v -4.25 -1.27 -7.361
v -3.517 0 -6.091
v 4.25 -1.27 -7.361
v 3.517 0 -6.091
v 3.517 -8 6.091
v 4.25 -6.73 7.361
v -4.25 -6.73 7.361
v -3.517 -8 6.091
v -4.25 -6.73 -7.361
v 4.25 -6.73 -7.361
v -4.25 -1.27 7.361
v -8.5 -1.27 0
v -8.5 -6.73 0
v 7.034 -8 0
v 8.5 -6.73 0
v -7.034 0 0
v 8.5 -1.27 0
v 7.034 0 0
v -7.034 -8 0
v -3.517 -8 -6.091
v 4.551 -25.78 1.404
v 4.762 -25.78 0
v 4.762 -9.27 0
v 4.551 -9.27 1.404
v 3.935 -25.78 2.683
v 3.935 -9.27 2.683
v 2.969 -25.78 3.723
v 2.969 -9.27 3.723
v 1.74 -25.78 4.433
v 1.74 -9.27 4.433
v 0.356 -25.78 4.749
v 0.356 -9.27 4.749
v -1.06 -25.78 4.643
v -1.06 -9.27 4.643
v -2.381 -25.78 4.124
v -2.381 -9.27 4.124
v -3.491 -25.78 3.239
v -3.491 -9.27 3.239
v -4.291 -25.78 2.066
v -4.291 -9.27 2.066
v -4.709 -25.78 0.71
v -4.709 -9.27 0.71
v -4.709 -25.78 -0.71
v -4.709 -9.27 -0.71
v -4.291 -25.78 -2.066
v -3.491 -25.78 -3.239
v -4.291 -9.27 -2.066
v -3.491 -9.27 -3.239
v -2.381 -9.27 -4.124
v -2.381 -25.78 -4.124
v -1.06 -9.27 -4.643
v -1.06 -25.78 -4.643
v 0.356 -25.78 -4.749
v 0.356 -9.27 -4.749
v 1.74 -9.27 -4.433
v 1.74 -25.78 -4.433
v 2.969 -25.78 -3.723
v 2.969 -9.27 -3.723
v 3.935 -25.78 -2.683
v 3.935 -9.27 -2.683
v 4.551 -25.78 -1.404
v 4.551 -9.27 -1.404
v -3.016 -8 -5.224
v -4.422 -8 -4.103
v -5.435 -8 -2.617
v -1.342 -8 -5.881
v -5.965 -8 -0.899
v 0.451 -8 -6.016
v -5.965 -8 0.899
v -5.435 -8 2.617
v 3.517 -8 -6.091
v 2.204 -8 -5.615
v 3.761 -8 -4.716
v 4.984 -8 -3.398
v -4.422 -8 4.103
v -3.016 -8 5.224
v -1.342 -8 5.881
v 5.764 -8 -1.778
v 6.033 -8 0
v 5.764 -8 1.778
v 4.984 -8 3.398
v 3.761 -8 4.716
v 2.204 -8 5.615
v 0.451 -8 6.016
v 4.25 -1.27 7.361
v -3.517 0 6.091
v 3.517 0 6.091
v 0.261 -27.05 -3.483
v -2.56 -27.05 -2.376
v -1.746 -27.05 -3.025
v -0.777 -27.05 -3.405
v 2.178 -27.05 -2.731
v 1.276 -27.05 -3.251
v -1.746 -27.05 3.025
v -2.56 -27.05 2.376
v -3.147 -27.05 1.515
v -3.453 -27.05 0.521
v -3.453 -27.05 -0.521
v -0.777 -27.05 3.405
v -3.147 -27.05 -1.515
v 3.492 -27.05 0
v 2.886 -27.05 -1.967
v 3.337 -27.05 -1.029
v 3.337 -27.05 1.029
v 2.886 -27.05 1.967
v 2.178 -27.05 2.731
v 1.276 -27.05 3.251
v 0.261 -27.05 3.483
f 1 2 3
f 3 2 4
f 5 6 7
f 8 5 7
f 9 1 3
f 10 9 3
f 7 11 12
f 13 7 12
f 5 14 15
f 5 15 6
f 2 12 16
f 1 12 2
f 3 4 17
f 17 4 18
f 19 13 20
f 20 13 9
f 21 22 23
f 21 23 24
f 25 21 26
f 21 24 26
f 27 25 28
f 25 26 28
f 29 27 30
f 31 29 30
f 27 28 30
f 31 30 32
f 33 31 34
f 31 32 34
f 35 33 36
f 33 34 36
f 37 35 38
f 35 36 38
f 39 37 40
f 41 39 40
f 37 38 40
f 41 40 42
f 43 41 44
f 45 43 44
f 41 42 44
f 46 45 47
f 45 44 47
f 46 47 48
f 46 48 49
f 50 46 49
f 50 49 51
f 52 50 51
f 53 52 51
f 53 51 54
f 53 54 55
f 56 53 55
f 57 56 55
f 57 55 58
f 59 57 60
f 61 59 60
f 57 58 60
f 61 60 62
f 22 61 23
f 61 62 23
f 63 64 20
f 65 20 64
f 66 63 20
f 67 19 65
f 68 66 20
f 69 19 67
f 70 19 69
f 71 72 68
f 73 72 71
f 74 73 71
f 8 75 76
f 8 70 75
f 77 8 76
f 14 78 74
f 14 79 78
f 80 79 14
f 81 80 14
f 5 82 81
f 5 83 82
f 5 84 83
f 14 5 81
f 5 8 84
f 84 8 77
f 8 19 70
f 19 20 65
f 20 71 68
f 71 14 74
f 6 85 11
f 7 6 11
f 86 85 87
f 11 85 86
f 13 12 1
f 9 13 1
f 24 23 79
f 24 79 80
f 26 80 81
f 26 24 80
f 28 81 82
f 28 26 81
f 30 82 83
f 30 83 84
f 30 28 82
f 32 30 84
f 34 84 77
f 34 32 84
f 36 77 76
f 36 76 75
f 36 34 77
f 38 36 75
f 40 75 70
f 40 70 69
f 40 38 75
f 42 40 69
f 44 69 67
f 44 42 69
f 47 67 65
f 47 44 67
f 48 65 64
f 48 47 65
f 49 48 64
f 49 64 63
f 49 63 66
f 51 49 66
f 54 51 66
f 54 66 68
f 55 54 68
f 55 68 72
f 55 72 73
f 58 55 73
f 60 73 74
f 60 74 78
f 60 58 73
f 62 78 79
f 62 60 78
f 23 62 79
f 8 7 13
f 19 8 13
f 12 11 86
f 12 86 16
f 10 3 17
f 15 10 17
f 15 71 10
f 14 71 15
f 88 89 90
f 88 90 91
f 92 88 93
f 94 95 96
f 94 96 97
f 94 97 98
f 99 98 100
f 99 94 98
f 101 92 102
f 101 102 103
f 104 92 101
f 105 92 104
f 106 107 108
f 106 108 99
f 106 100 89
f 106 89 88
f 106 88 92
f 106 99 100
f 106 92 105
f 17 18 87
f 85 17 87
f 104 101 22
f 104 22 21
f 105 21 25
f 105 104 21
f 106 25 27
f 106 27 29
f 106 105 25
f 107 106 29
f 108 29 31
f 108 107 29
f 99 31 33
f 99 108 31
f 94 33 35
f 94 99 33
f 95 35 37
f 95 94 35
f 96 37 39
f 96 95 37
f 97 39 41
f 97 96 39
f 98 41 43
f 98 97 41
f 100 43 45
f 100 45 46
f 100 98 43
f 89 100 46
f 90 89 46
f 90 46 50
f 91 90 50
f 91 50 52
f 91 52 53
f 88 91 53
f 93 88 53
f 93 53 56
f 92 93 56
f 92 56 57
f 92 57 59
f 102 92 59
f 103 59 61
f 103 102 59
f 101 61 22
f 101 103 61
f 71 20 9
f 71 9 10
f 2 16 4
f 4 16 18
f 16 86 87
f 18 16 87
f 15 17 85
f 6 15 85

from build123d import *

# Parameters (mm, degrees)
F1_DEPTH = 8
F2_R     = 4.7625
F3_DEPTH = 19.05
F4_SIZE  = 1.27


with BuildPart() as f1:
    # F0 (on Front) → F1 (new body)
    with BuildSketch(Plane.XZ):
        Polygon((4.25, -7.361216), (8.5, 0), (4.25, 7.361216), (-4.25, 7.361216), (-8.5, 0), (-4.25, -7.361216), align=None)
    extrude(amount=F1_DEPTH)

    # F2 (on face) → F3 (join)
    with BuildSketch(Plane.XZ.offset(8)):
        Circle(F2_R)
    extrude(amount=F3_DEPTH)

    # F4
    f4_edges = [f1.edges().sort_by_distance(p)[0] for p in [
        (-4.7625, -27.05, 0),
        (6.375, 0, 3.680608),
        (0, 0, -7.361216),
        (6.375, 0, -3.680608),
        (-6.375, 0, -3.680608),
        (-6.375, 0, 3.680608),
        (0, 0, 7.361216),
        (6.375, -8, 3.680608),
        (6.375, -8, -3.680608),
        (4.7625, -17.525, 0),
        (-4.7625, -8, 0),
        (0, -8, 7.361216),
        (-6.375, -8, 3.680608),
        (0, -8, -7.361216),
        (-6.375, -8, -3.680608),
    ]]
    chamfer(f4_edges, length=F4_SIZE)


solid = f1.part
